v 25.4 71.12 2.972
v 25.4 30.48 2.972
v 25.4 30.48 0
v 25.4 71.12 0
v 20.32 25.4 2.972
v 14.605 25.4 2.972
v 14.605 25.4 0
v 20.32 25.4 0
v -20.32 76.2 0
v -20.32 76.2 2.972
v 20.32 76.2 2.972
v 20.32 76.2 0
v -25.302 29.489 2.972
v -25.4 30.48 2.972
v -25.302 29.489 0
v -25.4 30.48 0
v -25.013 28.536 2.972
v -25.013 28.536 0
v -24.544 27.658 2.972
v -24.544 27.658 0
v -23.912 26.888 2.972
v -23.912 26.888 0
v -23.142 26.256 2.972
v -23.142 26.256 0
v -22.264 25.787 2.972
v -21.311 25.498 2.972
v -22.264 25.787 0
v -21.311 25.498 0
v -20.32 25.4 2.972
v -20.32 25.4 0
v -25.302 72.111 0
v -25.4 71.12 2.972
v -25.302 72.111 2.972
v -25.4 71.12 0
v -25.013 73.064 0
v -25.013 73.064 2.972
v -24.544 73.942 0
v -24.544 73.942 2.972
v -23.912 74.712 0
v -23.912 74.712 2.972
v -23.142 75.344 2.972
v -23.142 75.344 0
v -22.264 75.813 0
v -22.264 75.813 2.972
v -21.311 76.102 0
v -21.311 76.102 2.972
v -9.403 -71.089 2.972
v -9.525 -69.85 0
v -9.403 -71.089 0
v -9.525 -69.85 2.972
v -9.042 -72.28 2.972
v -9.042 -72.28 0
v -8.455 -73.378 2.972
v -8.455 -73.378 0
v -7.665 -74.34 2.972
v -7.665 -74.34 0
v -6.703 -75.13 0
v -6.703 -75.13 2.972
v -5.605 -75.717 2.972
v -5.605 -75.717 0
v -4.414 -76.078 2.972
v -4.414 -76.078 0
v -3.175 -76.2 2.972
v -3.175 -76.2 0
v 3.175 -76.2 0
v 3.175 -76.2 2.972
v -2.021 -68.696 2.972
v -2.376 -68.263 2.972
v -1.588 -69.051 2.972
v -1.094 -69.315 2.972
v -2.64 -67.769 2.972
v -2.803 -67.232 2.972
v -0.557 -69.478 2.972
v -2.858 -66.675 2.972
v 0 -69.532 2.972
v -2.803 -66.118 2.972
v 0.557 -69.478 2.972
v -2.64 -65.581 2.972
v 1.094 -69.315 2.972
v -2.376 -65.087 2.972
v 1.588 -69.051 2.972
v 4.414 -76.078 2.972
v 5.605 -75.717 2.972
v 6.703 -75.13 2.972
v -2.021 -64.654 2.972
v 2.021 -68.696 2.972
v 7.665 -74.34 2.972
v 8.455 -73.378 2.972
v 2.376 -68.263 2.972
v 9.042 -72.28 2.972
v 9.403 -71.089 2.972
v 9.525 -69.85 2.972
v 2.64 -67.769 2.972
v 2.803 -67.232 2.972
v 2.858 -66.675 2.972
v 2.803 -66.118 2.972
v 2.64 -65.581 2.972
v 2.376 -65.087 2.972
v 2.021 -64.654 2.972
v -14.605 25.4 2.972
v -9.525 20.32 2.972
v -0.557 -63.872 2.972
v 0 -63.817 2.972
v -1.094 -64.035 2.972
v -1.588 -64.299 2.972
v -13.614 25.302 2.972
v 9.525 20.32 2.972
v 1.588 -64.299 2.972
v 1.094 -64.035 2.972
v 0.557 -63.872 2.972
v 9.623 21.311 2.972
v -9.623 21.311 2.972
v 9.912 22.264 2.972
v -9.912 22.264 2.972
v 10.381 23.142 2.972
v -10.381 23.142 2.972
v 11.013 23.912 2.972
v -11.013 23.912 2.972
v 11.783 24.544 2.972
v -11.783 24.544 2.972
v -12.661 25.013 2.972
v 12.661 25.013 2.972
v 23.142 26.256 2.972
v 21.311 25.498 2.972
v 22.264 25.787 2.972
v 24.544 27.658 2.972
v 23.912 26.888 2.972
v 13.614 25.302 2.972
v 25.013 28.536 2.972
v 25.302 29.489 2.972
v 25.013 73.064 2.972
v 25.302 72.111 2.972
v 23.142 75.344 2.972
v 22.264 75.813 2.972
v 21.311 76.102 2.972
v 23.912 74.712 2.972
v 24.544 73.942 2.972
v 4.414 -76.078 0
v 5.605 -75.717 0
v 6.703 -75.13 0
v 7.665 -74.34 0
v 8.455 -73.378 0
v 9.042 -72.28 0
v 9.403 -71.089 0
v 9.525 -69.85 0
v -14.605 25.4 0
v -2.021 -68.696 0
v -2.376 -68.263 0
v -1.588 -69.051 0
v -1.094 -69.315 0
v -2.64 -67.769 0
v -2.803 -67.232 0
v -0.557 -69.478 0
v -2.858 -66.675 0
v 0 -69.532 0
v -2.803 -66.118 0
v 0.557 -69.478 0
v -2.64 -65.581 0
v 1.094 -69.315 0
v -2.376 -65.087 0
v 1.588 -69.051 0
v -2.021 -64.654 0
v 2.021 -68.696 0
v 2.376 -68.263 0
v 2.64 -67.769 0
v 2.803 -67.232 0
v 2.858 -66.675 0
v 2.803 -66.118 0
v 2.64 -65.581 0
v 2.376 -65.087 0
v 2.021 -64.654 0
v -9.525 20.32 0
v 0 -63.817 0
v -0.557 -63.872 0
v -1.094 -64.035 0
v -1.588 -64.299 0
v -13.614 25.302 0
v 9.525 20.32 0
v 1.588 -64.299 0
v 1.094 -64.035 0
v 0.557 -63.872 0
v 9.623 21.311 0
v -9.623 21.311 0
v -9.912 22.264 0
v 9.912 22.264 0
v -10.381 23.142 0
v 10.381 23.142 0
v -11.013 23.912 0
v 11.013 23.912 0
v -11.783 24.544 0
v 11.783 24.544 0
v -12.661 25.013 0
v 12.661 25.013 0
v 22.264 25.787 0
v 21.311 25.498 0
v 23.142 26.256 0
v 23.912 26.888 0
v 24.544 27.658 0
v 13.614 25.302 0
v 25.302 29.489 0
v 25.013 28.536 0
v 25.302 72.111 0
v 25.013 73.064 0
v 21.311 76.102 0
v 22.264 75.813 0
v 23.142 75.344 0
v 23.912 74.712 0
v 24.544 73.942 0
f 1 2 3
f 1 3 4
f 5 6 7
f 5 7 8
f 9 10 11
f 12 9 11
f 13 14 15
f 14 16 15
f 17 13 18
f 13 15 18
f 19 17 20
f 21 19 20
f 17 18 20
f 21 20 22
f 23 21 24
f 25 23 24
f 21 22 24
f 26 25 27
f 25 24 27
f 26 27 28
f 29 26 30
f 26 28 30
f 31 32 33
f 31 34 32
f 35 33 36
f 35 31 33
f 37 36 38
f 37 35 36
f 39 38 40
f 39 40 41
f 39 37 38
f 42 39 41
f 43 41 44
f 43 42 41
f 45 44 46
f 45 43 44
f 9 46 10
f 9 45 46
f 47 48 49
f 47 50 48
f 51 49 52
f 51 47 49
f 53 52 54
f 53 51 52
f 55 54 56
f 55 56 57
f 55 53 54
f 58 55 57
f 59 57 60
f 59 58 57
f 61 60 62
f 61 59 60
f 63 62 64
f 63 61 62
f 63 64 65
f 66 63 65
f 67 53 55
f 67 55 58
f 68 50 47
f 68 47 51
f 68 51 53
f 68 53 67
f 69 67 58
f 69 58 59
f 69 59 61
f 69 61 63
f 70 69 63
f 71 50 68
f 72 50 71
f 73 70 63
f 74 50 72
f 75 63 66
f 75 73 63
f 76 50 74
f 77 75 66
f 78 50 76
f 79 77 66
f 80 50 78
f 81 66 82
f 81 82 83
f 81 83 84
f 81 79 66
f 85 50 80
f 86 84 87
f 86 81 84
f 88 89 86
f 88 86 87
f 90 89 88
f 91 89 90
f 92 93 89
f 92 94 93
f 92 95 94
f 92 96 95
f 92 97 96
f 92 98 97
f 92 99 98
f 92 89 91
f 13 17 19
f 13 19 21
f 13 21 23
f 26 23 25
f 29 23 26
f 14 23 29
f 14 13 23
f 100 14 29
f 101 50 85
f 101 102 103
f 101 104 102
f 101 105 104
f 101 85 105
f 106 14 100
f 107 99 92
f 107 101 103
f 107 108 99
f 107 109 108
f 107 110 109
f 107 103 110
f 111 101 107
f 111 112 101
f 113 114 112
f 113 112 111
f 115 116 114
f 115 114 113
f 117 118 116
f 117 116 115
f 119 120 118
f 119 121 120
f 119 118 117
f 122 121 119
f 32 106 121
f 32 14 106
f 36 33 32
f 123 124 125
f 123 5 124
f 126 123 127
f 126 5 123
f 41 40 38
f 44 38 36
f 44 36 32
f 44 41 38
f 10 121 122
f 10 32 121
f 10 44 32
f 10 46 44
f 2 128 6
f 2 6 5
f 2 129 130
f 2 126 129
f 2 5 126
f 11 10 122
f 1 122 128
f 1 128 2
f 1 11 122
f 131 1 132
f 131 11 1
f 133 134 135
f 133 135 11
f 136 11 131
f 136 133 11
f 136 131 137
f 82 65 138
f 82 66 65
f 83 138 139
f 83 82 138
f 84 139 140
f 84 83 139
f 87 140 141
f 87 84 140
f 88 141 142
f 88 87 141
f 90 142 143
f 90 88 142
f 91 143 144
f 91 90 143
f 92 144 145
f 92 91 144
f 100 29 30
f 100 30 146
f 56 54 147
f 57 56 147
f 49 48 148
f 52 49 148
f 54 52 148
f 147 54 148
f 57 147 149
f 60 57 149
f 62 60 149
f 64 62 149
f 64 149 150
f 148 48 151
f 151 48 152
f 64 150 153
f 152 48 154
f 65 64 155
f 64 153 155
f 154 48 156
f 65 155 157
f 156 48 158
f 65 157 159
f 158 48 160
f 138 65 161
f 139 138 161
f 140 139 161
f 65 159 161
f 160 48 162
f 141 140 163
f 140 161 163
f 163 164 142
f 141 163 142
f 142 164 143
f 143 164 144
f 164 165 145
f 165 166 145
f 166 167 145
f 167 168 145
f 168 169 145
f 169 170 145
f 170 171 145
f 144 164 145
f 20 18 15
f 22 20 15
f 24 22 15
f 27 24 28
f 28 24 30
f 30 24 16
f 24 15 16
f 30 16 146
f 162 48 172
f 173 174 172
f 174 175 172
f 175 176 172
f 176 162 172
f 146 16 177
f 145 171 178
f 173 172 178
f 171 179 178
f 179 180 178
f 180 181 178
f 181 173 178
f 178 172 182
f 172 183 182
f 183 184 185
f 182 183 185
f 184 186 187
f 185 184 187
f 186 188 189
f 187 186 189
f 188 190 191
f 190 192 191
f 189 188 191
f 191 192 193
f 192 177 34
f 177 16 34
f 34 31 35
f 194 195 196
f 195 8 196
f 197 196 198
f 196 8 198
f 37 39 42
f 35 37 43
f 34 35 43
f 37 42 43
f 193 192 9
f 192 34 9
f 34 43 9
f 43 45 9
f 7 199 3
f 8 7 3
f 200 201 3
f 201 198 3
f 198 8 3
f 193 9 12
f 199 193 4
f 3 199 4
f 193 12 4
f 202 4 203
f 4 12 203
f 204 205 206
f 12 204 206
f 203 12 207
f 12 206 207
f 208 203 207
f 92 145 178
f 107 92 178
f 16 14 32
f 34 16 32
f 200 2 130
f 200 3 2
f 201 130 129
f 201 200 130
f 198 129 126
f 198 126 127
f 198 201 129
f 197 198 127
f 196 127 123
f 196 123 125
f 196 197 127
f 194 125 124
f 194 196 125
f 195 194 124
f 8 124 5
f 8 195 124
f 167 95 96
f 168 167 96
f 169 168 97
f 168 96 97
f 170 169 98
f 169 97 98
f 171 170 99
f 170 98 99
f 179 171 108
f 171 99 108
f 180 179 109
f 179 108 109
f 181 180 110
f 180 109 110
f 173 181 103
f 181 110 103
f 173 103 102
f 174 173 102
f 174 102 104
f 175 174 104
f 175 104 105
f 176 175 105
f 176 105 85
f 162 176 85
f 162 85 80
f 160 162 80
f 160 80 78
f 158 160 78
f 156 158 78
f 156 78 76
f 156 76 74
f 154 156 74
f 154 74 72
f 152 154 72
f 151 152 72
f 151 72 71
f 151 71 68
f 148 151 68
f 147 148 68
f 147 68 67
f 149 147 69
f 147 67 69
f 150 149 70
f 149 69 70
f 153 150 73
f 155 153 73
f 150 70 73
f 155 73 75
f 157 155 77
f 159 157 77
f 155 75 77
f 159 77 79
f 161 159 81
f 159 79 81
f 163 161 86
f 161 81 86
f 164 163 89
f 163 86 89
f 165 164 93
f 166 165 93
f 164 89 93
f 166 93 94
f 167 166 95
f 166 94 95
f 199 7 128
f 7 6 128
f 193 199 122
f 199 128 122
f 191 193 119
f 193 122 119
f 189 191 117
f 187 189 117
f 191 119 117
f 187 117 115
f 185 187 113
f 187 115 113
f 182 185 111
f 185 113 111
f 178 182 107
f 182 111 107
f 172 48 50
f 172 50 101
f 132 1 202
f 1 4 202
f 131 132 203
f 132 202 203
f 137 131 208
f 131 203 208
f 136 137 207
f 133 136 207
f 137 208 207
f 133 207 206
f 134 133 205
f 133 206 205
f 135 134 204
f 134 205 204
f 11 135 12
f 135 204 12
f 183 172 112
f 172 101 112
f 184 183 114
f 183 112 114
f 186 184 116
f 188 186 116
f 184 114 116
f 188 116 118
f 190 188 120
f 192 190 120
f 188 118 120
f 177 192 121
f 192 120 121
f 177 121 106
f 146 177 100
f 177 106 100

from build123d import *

# Parameters (mm, degrees)
F0_W     = 19.05
F0_H     = 152.4
F1_DEPTH = 2.9718
F2_R     = 6.35
F3_R     = 2.8575
F4_DEPTH = 25.4
F5_W     = 50.8
F5_H     = 50.8
F6_DEPTH = 2.9718
F7_R     = 5.08


with BuildPart() as f1:
    # F0 (on Top) → F1 (new body)
    with BuildSketch(Plane.XY):
        Rectangle(F0_W, F0_H)
    extrude(amount=F1_DEPTH)

    # F2
    f2_edges = [f1.edges().sort_by_distance(p)[0] for p in [
        (9.525, -76.2, 1.4859),
        (-9.525, -76.2, 1.4859),
    ]]
    fillet(f2_edges, radius=F2_R)

    # F3 (on face) → F4 (cut)
    with BuildSketch(Plane.XY.offset(2.9718)):
        with Locations((0, -66.675)):
            Circle(F3_R)
    extrude(amount=-F4_DEPTH, mode=Mode.SUBTRACT)

    # F5 (on face) → F6 (join)
    with BuildSketch(Plane.XY.offset(2.9718)):
        with Locations((0, 50.8)):
            Rectangle(F5_W, F5_H)
    extrude(amount=-F6_DEPTH)

    # F7
    f7_edges = [f1.edges().sort_by_distance(p)[0] for p in [
        (9.525, 25.4, 1.4859),
        (25.4, 25.4, 1.4859),
        (-9.525, 25.4, 1.4859),
        (-25.4, 25.4, 1.4859),
        (25.4, 76.2, 1.4859),
        (-25.4, 76.2, 1.4859),
    ]]
    fillet(f7_edges, radius=F7_R)


solid = f1.part
